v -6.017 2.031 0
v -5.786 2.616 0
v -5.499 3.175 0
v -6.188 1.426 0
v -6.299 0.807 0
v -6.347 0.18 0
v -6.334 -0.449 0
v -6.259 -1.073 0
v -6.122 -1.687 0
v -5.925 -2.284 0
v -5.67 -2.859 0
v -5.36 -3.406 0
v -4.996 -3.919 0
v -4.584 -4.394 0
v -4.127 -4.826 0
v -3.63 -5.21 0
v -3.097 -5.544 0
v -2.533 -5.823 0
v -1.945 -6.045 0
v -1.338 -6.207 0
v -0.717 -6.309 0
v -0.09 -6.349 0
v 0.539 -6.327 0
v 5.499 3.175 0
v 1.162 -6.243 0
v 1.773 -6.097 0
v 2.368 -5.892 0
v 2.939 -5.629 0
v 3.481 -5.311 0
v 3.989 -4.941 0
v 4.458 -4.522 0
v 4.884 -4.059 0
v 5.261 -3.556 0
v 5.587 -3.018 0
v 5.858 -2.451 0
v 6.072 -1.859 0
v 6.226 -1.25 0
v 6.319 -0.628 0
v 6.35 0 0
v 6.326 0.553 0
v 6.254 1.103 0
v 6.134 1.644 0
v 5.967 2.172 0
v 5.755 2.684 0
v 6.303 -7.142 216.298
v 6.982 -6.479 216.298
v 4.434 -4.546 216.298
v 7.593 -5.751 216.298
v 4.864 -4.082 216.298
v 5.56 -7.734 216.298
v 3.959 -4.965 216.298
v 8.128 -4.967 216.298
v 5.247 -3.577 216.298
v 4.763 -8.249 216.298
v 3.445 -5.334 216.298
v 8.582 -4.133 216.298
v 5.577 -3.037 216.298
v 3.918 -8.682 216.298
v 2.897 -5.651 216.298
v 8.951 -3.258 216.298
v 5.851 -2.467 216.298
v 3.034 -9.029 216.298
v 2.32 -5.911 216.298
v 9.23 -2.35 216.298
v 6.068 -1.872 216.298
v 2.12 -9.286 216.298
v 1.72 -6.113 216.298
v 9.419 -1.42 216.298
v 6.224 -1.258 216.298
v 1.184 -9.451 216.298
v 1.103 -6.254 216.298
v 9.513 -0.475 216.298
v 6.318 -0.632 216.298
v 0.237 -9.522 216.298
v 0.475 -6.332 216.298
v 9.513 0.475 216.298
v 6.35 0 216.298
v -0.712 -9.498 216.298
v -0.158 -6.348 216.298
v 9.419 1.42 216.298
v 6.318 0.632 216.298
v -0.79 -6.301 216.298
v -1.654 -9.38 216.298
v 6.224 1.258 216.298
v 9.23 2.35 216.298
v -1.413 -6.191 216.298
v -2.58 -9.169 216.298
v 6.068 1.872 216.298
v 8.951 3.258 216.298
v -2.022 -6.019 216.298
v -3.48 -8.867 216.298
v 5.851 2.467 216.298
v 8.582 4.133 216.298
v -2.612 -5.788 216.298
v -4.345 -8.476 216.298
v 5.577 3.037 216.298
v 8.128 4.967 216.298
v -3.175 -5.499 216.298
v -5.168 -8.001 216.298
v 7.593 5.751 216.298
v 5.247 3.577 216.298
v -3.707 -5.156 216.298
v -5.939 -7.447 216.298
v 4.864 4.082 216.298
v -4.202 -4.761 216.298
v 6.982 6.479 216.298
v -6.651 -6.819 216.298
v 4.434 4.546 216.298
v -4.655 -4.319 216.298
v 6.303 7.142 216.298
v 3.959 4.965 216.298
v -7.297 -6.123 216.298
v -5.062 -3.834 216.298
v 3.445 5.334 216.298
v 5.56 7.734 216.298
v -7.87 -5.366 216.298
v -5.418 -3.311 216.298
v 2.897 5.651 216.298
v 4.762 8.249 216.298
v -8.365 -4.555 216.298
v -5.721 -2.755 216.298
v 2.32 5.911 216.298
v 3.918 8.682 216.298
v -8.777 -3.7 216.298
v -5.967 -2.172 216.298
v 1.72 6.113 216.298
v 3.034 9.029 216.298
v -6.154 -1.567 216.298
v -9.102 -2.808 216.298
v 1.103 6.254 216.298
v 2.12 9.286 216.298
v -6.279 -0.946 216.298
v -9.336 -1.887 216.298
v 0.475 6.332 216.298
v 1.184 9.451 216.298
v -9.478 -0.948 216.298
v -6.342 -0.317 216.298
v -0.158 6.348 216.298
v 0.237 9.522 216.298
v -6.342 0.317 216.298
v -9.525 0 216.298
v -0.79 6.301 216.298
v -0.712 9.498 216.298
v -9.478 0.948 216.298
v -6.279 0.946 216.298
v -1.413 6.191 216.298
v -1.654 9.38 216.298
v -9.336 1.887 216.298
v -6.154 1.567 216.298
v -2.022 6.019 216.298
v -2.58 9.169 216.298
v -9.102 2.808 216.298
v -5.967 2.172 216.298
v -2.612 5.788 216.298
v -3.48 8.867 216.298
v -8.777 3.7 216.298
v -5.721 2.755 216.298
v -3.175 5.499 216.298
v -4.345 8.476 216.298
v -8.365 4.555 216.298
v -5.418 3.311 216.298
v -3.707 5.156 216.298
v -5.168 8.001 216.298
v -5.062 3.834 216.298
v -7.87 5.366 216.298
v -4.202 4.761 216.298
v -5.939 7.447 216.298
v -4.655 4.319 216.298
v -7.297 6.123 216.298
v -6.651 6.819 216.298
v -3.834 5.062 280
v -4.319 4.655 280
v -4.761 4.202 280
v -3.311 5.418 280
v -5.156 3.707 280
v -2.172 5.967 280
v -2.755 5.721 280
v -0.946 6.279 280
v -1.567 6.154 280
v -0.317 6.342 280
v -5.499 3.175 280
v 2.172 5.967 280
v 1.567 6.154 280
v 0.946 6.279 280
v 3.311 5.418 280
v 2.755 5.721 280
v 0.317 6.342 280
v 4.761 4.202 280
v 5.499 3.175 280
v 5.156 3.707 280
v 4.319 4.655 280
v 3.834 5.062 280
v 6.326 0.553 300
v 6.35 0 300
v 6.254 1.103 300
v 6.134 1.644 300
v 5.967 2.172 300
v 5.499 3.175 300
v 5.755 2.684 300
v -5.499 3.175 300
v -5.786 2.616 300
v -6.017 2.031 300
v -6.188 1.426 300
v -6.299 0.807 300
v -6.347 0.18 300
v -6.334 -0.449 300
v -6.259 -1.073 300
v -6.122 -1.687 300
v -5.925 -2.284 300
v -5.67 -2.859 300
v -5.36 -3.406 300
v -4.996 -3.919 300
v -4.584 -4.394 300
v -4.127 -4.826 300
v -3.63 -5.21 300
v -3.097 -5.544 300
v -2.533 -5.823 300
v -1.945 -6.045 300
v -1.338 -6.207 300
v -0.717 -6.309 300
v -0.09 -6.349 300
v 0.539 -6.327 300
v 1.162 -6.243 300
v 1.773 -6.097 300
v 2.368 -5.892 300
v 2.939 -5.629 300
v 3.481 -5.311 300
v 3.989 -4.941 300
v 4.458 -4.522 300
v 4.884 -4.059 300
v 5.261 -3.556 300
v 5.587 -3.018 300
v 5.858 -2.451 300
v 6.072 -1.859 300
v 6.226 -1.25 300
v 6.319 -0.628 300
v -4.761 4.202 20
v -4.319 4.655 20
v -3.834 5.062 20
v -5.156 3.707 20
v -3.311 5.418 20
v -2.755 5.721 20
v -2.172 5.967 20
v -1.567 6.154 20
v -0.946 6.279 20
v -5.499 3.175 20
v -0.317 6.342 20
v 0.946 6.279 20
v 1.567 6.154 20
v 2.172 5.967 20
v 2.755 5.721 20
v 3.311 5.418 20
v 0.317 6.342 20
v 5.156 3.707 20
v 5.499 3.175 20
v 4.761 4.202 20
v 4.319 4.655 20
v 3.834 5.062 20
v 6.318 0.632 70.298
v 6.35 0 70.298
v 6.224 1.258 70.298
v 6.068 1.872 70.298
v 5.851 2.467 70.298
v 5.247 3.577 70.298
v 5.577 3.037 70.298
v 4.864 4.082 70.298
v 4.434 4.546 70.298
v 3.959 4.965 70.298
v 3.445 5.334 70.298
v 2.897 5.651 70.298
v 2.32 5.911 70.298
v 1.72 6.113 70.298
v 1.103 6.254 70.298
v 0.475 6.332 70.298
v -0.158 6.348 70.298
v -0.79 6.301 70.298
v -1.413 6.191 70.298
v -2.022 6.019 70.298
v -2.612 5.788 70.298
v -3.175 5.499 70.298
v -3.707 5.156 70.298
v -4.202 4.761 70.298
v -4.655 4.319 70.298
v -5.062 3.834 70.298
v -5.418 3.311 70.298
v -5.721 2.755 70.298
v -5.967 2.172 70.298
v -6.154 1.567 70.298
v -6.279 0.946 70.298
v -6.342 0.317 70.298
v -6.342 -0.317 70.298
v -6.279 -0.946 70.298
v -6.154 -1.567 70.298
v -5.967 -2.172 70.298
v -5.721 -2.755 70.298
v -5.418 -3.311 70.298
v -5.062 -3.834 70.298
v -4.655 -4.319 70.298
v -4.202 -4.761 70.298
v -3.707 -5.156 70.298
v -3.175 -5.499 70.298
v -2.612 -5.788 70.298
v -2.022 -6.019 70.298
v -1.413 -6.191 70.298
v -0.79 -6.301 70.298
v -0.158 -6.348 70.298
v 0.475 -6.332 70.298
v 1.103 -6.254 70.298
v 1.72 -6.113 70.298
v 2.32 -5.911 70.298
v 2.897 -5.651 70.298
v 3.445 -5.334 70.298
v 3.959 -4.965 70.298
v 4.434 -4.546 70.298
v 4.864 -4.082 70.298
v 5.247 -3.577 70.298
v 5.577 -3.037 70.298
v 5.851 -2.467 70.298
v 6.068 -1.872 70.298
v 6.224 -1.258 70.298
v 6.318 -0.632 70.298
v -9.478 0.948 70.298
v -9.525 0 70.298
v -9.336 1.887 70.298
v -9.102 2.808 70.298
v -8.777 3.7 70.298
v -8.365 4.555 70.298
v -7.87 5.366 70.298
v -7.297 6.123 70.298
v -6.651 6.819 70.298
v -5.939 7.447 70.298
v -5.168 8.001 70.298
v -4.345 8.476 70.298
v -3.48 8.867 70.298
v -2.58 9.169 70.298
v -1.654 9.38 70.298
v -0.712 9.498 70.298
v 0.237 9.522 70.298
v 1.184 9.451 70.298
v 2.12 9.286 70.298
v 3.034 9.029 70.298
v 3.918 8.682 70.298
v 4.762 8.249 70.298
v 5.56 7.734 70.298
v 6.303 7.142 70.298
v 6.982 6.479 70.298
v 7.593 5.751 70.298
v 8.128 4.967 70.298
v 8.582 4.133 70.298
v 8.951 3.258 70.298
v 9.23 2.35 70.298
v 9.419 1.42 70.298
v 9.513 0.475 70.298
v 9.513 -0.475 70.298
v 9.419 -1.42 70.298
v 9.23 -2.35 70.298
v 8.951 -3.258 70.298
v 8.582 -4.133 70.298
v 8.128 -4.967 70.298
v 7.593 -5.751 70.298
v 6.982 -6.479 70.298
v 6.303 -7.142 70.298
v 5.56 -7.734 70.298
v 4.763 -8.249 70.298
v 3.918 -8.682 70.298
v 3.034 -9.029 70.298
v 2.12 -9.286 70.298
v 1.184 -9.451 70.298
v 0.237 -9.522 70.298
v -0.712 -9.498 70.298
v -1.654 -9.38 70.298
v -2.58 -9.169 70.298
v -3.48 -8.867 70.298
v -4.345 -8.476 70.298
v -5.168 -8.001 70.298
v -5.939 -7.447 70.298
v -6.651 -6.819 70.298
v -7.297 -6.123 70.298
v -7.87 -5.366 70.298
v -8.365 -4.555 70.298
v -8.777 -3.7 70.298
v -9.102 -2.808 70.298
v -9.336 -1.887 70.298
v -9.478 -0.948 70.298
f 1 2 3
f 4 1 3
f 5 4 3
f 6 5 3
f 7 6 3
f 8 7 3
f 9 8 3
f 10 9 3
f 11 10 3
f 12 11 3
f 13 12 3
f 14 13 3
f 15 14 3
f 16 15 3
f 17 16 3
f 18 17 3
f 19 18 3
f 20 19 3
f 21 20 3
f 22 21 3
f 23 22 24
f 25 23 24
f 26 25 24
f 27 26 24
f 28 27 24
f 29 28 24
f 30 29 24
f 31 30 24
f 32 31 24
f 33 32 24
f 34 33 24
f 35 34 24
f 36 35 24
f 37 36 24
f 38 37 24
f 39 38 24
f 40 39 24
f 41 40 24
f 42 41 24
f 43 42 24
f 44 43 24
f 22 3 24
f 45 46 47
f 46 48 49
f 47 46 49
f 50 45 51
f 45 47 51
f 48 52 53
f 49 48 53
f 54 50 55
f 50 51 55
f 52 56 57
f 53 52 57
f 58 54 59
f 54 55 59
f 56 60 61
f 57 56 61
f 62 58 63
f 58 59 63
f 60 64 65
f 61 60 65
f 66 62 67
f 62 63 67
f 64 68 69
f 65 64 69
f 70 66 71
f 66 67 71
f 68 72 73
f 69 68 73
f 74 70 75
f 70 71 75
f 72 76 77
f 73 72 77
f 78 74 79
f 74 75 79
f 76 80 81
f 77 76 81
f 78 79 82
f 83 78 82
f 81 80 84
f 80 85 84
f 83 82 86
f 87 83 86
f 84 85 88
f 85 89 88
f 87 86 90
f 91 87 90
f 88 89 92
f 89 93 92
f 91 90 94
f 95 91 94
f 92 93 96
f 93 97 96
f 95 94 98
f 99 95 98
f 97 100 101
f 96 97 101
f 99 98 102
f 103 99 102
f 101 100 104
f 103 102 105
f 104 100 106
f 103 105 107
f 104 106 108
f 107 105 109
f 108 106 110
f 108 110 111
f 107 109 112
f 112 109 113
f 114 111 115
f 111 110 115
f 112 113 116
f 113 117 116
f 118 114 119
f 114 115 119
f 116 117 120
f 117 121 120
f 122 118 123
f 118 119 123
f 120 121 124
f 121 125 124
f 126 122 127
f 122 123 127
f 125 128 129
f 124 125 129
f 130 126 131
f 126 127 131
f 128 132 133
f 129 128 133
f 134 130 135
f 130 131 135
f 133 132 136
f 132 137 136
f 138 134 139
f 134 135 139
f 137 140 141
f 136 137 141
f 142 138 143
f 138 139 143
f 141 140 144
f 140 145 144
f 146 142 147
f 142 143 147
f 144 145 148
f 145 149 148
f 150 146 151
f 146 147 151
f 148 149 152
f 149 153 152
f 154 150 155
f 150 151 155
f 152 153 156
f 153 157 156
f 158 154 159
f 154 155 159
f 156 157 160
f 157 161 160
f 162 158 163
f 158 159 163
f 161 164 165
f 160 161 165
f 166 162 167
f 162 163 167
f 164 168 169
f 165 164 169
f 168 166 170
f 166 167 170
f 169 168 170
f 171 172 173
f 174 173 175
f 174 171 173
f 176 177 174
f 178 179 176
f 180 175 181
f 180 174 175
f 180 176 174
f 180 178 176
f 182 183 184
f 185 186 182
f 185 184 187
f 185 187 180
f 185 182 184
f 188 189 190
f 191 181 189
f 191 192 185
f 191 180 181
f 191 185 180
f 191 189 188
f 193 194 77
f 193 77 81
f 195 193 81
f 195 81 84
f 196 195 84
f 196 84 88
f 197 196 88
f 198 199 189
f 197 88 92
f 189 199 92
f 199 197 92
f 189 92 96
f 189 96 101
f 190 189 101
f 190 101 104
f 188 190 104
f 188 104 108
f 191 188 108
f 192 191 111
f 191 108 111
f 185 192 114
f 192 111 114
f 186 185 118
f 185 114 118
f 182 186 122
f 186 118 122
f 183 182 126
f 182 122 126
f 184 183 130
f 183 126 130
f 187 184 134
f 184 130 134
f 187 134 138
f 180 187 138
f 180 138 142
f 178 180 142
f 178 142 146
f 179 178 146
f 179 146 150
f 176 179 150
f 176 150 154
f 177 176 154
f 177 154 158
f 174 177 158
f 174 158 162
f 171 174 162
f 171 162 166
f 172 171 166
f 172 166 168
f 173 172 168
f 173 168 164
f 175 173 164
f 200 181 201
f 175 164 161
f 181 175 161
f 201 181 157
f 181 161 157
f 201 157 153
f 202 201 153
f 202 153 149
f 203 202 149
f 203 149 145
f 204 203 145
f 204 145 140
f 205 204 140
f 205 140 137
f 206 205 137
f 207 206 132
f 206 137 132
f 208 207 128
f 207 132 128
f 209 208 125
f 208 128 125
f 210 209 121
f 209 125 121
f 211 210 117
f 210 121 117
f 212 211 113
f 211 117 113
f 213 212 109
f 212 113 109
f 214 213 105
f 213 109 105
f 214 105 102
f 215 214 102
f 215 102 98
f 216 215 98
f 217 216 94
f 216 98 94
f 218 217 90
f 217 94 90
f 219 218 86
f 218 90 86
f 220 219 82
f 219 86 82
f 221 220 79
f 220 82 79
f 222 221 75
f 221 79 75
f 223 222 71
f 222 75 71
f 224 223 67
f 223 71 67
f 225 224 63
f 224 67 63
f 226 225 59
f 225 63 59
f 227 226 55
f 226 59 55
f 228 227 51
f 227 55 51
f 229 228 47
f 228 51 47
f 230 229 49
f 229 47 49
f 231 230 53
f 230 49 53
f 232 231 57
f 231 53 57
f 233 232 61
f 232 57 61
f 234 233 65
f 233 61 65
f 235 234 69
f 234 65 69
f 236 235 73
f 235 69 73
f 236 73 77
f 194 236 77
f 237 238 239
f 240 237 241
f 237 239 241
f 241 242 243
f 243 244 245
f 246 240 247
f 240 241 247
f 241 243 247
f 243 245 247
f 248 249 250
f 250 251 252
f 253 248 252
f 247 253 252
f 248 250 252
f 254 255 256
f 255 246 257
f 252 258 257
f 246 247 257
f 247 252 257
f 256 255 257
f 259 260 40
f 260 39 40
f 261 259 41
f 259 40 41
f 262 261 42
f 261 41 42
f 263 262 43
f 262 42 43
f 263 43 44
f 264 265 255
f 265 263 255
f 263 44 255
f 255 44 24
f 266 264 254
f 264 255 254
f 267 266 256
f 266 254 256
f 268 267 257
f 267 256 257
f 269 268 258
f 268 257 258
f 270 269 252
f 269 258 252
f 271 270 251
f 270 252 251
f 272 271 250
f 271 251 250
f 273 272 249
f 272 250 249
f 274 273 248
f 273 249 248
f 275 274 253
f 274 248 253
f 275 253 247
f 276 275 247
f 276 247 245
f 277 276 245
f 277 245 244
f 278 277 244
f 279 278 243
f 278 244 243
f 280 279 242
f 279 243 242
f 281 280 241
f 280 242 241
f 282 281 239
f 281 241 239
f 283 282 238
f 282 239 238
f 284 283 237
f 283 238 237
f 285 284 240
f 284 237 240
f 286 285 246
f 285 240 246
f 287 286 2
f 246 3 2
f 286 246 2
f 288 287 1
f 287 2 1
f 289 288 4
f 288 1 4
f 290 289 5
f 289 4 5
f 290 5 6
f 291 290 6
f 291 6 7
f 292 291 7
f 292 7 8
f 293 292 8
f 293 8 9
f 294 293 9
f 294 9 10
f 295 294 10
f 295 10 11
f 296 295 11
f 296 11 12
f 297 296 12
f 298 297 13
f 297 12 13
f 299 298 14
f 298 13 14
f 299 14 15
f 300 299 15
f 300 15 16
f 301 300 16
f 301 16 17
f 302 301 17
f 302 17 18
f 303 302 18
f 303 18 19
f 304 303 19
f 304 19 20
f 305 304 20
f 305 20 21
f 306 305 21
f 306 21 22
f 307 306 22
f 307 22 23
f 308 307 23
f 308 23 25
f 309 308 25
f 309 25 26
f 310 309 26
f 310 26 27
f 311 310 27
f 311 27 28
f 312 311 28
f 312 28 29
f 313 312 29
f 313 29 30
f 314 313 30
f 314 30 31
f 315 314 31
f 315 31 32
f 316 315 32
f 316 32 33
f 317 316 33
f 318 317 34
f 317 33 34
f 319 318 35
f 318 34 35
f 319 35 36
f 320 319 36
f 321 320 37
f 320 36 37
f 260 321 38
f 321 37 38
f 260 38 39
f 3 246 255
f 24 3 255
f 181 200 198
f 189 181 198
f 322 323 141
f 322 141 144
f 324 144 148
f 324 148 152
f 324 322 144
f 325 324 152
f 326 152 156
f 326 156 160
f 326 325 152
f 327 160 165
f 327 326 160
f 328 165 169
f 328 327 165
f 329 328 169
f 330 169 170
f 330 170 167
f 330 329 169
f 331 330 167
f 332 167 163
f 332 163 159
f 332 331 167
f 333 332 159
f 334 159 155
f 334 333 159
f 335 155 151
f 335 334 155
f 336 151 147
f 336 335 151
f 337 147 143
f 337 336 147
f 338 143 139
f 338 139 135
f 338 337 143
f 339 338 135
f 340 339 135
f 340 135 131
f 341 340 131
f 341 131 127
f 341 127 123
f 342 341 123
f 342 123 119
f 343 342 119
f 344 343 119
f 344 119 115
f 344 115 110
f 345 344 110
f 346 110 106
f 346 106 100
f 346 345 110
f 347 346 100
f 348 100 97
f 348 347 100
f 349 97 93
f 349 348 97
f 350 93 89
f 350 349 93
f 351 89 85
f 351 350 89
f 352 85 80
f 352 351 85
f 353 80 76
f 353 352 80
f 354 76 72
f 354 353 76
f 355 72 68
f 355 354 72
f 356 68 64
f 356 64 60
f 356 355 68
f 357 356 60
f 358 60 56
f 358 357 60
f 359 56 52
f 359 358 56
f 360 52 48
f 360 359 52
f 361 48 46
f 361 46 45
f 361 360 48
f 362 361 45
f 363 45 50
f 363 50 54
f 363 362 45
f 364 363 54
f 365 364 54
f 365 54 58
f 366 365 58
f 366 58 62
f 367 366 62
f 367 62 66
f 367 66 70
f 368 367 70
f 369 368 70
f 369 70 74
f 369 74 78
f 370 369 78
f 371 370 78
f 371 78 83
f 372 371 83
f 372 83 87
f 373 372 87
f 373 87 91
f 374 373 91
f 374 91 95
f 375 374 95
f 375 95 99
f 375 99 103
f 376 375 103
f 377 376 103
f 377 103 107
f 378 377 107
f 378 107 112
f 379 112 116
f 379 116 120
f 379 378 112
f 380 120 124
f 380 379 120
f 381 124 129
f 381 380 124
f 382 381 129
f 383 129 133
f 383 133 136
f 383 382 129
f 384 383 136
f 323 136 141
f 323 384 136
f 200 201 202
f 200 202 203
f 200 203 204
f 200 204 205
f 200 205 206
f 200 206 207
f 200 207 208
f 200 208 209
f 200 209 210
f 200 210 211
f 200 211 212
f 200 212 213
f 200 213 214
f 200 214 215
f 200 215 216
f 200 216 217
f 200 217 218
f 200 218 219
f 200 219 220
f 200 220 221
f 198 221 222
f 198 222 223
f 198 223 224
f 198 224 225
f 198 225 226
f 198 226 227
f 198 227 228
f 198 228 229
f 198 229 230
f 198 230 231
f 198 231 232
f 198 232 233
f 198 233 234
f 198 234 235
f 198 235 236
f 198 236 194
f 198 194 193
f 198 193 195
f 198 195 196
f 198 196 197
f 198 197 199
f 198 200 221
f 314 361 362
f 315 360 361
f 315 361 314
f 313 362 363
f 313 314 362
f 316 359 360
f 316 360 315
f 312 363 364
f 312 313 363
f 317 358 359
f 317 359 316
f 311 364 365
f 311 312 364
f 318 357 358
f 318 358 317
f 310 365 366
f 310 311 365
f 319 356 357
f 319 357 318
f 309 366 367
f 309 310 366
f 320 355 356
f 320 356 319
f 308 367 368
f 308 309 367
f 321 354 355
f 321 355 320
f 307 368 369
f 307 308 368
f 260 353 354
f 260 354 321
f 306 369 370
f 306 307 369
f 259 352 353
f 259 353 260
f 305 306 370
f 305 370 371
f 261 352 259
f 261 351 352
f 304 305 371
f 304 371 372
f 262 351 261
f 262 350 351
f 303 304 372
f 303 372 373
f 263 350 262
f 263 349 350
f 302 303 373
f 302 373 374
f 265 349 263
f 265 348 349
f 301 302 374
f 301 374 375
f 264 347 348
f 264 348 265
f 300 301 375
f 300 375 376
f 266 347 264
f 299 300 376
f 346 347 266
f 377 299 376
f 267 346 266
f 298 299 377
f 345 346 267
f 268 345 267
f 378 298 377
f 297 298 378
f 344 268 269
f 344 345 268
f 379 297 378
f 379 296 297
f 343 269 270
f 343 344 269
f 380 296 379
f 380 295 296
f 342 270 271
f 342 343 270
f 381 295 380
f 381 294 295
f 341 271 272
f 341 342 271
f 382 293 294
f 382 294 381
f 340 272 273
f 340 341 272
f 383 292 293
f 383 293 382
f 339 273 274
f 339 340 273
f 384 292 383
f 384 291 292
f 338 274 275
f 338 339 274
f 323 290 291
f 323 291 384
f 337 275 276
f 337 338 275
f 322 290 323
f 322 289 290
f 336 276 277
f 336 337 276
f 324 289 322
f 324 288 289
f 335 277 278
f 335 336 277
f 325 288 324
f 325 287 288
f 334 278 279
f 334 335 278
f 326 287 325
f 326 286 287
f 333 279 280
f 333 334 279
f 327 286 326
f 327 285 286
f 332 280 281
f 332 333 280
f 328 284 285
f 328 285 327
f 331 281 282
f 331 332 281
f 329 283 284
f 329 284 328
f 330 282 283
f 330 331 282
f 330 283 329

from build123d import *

# Parameters (mm, degrees)
SKETCH1_R           = 6.35
BOSS_EXTRUDE1_DEPTH = 300
BOSS_EXTRUDE2_START = -70.2975
SKETCH2_R           = 9.525
BOSS_EXTRUDE2_DEPTH = 146
CUT_EXTRUDE4_DEPTH  = 20
CUT_EXTRUDE5_START  = 280
CUT_EXTRUDE5_DEPTH  = 20


with BuildPart() as part:
    # Sketch1 → Boss-Extrude1 (new body)
    with BuildSketch(Plane.XY):
        Circle(SKETCH1_R)
    extrude(amount=BOSS_EXTRUDE1_DEPTH)

    # Sketch2 → Boss-Extrude2 (add)
    with BuildSketch(Plane(origin=(0, 0, 0), x_dir=(-1, 0, 0), z_dir=(0, 0, -1)).offset(BOSS_EXTRUDE2_START)):
        Circle(SKETCH2_R)
    extrude(amount=-BOSS_EXTRUDE2_DEPTH)

    # Sketch7 → Cut-Extrude4 (cut)
    with BuildSketch(Plane.XY):
        with BuildLine():
            Line((-5.499261314, 3.175), (5.499261314, 3.175))
            ThreePointArc((5.499261314, 3.175), (0, 6.35), (-5.499261314, 3.175))
        make_face()
    extrude(amount=CUT_EXTRUDE4_DEPTH, mode=Mode.SUBTRACT)

    # Sketch7<3> → Cut-Extrude5 (cut)
    with BuildSketch(Plane.XY.offset(CUT_EXTRUDE5_START)):
        with BuildLine():
            Line((-5.499261314, 3.175), (5.499261314, 3.175))
            ThreePointArc((5.499261314, 3.175), (0, 6.35), (-5.499261314, 3.175))
        make_face()
    extrude(amount=CUT_EXTRUDE5_DEPTH, mode=Mode.SUBTRACT)


solid = part.part
